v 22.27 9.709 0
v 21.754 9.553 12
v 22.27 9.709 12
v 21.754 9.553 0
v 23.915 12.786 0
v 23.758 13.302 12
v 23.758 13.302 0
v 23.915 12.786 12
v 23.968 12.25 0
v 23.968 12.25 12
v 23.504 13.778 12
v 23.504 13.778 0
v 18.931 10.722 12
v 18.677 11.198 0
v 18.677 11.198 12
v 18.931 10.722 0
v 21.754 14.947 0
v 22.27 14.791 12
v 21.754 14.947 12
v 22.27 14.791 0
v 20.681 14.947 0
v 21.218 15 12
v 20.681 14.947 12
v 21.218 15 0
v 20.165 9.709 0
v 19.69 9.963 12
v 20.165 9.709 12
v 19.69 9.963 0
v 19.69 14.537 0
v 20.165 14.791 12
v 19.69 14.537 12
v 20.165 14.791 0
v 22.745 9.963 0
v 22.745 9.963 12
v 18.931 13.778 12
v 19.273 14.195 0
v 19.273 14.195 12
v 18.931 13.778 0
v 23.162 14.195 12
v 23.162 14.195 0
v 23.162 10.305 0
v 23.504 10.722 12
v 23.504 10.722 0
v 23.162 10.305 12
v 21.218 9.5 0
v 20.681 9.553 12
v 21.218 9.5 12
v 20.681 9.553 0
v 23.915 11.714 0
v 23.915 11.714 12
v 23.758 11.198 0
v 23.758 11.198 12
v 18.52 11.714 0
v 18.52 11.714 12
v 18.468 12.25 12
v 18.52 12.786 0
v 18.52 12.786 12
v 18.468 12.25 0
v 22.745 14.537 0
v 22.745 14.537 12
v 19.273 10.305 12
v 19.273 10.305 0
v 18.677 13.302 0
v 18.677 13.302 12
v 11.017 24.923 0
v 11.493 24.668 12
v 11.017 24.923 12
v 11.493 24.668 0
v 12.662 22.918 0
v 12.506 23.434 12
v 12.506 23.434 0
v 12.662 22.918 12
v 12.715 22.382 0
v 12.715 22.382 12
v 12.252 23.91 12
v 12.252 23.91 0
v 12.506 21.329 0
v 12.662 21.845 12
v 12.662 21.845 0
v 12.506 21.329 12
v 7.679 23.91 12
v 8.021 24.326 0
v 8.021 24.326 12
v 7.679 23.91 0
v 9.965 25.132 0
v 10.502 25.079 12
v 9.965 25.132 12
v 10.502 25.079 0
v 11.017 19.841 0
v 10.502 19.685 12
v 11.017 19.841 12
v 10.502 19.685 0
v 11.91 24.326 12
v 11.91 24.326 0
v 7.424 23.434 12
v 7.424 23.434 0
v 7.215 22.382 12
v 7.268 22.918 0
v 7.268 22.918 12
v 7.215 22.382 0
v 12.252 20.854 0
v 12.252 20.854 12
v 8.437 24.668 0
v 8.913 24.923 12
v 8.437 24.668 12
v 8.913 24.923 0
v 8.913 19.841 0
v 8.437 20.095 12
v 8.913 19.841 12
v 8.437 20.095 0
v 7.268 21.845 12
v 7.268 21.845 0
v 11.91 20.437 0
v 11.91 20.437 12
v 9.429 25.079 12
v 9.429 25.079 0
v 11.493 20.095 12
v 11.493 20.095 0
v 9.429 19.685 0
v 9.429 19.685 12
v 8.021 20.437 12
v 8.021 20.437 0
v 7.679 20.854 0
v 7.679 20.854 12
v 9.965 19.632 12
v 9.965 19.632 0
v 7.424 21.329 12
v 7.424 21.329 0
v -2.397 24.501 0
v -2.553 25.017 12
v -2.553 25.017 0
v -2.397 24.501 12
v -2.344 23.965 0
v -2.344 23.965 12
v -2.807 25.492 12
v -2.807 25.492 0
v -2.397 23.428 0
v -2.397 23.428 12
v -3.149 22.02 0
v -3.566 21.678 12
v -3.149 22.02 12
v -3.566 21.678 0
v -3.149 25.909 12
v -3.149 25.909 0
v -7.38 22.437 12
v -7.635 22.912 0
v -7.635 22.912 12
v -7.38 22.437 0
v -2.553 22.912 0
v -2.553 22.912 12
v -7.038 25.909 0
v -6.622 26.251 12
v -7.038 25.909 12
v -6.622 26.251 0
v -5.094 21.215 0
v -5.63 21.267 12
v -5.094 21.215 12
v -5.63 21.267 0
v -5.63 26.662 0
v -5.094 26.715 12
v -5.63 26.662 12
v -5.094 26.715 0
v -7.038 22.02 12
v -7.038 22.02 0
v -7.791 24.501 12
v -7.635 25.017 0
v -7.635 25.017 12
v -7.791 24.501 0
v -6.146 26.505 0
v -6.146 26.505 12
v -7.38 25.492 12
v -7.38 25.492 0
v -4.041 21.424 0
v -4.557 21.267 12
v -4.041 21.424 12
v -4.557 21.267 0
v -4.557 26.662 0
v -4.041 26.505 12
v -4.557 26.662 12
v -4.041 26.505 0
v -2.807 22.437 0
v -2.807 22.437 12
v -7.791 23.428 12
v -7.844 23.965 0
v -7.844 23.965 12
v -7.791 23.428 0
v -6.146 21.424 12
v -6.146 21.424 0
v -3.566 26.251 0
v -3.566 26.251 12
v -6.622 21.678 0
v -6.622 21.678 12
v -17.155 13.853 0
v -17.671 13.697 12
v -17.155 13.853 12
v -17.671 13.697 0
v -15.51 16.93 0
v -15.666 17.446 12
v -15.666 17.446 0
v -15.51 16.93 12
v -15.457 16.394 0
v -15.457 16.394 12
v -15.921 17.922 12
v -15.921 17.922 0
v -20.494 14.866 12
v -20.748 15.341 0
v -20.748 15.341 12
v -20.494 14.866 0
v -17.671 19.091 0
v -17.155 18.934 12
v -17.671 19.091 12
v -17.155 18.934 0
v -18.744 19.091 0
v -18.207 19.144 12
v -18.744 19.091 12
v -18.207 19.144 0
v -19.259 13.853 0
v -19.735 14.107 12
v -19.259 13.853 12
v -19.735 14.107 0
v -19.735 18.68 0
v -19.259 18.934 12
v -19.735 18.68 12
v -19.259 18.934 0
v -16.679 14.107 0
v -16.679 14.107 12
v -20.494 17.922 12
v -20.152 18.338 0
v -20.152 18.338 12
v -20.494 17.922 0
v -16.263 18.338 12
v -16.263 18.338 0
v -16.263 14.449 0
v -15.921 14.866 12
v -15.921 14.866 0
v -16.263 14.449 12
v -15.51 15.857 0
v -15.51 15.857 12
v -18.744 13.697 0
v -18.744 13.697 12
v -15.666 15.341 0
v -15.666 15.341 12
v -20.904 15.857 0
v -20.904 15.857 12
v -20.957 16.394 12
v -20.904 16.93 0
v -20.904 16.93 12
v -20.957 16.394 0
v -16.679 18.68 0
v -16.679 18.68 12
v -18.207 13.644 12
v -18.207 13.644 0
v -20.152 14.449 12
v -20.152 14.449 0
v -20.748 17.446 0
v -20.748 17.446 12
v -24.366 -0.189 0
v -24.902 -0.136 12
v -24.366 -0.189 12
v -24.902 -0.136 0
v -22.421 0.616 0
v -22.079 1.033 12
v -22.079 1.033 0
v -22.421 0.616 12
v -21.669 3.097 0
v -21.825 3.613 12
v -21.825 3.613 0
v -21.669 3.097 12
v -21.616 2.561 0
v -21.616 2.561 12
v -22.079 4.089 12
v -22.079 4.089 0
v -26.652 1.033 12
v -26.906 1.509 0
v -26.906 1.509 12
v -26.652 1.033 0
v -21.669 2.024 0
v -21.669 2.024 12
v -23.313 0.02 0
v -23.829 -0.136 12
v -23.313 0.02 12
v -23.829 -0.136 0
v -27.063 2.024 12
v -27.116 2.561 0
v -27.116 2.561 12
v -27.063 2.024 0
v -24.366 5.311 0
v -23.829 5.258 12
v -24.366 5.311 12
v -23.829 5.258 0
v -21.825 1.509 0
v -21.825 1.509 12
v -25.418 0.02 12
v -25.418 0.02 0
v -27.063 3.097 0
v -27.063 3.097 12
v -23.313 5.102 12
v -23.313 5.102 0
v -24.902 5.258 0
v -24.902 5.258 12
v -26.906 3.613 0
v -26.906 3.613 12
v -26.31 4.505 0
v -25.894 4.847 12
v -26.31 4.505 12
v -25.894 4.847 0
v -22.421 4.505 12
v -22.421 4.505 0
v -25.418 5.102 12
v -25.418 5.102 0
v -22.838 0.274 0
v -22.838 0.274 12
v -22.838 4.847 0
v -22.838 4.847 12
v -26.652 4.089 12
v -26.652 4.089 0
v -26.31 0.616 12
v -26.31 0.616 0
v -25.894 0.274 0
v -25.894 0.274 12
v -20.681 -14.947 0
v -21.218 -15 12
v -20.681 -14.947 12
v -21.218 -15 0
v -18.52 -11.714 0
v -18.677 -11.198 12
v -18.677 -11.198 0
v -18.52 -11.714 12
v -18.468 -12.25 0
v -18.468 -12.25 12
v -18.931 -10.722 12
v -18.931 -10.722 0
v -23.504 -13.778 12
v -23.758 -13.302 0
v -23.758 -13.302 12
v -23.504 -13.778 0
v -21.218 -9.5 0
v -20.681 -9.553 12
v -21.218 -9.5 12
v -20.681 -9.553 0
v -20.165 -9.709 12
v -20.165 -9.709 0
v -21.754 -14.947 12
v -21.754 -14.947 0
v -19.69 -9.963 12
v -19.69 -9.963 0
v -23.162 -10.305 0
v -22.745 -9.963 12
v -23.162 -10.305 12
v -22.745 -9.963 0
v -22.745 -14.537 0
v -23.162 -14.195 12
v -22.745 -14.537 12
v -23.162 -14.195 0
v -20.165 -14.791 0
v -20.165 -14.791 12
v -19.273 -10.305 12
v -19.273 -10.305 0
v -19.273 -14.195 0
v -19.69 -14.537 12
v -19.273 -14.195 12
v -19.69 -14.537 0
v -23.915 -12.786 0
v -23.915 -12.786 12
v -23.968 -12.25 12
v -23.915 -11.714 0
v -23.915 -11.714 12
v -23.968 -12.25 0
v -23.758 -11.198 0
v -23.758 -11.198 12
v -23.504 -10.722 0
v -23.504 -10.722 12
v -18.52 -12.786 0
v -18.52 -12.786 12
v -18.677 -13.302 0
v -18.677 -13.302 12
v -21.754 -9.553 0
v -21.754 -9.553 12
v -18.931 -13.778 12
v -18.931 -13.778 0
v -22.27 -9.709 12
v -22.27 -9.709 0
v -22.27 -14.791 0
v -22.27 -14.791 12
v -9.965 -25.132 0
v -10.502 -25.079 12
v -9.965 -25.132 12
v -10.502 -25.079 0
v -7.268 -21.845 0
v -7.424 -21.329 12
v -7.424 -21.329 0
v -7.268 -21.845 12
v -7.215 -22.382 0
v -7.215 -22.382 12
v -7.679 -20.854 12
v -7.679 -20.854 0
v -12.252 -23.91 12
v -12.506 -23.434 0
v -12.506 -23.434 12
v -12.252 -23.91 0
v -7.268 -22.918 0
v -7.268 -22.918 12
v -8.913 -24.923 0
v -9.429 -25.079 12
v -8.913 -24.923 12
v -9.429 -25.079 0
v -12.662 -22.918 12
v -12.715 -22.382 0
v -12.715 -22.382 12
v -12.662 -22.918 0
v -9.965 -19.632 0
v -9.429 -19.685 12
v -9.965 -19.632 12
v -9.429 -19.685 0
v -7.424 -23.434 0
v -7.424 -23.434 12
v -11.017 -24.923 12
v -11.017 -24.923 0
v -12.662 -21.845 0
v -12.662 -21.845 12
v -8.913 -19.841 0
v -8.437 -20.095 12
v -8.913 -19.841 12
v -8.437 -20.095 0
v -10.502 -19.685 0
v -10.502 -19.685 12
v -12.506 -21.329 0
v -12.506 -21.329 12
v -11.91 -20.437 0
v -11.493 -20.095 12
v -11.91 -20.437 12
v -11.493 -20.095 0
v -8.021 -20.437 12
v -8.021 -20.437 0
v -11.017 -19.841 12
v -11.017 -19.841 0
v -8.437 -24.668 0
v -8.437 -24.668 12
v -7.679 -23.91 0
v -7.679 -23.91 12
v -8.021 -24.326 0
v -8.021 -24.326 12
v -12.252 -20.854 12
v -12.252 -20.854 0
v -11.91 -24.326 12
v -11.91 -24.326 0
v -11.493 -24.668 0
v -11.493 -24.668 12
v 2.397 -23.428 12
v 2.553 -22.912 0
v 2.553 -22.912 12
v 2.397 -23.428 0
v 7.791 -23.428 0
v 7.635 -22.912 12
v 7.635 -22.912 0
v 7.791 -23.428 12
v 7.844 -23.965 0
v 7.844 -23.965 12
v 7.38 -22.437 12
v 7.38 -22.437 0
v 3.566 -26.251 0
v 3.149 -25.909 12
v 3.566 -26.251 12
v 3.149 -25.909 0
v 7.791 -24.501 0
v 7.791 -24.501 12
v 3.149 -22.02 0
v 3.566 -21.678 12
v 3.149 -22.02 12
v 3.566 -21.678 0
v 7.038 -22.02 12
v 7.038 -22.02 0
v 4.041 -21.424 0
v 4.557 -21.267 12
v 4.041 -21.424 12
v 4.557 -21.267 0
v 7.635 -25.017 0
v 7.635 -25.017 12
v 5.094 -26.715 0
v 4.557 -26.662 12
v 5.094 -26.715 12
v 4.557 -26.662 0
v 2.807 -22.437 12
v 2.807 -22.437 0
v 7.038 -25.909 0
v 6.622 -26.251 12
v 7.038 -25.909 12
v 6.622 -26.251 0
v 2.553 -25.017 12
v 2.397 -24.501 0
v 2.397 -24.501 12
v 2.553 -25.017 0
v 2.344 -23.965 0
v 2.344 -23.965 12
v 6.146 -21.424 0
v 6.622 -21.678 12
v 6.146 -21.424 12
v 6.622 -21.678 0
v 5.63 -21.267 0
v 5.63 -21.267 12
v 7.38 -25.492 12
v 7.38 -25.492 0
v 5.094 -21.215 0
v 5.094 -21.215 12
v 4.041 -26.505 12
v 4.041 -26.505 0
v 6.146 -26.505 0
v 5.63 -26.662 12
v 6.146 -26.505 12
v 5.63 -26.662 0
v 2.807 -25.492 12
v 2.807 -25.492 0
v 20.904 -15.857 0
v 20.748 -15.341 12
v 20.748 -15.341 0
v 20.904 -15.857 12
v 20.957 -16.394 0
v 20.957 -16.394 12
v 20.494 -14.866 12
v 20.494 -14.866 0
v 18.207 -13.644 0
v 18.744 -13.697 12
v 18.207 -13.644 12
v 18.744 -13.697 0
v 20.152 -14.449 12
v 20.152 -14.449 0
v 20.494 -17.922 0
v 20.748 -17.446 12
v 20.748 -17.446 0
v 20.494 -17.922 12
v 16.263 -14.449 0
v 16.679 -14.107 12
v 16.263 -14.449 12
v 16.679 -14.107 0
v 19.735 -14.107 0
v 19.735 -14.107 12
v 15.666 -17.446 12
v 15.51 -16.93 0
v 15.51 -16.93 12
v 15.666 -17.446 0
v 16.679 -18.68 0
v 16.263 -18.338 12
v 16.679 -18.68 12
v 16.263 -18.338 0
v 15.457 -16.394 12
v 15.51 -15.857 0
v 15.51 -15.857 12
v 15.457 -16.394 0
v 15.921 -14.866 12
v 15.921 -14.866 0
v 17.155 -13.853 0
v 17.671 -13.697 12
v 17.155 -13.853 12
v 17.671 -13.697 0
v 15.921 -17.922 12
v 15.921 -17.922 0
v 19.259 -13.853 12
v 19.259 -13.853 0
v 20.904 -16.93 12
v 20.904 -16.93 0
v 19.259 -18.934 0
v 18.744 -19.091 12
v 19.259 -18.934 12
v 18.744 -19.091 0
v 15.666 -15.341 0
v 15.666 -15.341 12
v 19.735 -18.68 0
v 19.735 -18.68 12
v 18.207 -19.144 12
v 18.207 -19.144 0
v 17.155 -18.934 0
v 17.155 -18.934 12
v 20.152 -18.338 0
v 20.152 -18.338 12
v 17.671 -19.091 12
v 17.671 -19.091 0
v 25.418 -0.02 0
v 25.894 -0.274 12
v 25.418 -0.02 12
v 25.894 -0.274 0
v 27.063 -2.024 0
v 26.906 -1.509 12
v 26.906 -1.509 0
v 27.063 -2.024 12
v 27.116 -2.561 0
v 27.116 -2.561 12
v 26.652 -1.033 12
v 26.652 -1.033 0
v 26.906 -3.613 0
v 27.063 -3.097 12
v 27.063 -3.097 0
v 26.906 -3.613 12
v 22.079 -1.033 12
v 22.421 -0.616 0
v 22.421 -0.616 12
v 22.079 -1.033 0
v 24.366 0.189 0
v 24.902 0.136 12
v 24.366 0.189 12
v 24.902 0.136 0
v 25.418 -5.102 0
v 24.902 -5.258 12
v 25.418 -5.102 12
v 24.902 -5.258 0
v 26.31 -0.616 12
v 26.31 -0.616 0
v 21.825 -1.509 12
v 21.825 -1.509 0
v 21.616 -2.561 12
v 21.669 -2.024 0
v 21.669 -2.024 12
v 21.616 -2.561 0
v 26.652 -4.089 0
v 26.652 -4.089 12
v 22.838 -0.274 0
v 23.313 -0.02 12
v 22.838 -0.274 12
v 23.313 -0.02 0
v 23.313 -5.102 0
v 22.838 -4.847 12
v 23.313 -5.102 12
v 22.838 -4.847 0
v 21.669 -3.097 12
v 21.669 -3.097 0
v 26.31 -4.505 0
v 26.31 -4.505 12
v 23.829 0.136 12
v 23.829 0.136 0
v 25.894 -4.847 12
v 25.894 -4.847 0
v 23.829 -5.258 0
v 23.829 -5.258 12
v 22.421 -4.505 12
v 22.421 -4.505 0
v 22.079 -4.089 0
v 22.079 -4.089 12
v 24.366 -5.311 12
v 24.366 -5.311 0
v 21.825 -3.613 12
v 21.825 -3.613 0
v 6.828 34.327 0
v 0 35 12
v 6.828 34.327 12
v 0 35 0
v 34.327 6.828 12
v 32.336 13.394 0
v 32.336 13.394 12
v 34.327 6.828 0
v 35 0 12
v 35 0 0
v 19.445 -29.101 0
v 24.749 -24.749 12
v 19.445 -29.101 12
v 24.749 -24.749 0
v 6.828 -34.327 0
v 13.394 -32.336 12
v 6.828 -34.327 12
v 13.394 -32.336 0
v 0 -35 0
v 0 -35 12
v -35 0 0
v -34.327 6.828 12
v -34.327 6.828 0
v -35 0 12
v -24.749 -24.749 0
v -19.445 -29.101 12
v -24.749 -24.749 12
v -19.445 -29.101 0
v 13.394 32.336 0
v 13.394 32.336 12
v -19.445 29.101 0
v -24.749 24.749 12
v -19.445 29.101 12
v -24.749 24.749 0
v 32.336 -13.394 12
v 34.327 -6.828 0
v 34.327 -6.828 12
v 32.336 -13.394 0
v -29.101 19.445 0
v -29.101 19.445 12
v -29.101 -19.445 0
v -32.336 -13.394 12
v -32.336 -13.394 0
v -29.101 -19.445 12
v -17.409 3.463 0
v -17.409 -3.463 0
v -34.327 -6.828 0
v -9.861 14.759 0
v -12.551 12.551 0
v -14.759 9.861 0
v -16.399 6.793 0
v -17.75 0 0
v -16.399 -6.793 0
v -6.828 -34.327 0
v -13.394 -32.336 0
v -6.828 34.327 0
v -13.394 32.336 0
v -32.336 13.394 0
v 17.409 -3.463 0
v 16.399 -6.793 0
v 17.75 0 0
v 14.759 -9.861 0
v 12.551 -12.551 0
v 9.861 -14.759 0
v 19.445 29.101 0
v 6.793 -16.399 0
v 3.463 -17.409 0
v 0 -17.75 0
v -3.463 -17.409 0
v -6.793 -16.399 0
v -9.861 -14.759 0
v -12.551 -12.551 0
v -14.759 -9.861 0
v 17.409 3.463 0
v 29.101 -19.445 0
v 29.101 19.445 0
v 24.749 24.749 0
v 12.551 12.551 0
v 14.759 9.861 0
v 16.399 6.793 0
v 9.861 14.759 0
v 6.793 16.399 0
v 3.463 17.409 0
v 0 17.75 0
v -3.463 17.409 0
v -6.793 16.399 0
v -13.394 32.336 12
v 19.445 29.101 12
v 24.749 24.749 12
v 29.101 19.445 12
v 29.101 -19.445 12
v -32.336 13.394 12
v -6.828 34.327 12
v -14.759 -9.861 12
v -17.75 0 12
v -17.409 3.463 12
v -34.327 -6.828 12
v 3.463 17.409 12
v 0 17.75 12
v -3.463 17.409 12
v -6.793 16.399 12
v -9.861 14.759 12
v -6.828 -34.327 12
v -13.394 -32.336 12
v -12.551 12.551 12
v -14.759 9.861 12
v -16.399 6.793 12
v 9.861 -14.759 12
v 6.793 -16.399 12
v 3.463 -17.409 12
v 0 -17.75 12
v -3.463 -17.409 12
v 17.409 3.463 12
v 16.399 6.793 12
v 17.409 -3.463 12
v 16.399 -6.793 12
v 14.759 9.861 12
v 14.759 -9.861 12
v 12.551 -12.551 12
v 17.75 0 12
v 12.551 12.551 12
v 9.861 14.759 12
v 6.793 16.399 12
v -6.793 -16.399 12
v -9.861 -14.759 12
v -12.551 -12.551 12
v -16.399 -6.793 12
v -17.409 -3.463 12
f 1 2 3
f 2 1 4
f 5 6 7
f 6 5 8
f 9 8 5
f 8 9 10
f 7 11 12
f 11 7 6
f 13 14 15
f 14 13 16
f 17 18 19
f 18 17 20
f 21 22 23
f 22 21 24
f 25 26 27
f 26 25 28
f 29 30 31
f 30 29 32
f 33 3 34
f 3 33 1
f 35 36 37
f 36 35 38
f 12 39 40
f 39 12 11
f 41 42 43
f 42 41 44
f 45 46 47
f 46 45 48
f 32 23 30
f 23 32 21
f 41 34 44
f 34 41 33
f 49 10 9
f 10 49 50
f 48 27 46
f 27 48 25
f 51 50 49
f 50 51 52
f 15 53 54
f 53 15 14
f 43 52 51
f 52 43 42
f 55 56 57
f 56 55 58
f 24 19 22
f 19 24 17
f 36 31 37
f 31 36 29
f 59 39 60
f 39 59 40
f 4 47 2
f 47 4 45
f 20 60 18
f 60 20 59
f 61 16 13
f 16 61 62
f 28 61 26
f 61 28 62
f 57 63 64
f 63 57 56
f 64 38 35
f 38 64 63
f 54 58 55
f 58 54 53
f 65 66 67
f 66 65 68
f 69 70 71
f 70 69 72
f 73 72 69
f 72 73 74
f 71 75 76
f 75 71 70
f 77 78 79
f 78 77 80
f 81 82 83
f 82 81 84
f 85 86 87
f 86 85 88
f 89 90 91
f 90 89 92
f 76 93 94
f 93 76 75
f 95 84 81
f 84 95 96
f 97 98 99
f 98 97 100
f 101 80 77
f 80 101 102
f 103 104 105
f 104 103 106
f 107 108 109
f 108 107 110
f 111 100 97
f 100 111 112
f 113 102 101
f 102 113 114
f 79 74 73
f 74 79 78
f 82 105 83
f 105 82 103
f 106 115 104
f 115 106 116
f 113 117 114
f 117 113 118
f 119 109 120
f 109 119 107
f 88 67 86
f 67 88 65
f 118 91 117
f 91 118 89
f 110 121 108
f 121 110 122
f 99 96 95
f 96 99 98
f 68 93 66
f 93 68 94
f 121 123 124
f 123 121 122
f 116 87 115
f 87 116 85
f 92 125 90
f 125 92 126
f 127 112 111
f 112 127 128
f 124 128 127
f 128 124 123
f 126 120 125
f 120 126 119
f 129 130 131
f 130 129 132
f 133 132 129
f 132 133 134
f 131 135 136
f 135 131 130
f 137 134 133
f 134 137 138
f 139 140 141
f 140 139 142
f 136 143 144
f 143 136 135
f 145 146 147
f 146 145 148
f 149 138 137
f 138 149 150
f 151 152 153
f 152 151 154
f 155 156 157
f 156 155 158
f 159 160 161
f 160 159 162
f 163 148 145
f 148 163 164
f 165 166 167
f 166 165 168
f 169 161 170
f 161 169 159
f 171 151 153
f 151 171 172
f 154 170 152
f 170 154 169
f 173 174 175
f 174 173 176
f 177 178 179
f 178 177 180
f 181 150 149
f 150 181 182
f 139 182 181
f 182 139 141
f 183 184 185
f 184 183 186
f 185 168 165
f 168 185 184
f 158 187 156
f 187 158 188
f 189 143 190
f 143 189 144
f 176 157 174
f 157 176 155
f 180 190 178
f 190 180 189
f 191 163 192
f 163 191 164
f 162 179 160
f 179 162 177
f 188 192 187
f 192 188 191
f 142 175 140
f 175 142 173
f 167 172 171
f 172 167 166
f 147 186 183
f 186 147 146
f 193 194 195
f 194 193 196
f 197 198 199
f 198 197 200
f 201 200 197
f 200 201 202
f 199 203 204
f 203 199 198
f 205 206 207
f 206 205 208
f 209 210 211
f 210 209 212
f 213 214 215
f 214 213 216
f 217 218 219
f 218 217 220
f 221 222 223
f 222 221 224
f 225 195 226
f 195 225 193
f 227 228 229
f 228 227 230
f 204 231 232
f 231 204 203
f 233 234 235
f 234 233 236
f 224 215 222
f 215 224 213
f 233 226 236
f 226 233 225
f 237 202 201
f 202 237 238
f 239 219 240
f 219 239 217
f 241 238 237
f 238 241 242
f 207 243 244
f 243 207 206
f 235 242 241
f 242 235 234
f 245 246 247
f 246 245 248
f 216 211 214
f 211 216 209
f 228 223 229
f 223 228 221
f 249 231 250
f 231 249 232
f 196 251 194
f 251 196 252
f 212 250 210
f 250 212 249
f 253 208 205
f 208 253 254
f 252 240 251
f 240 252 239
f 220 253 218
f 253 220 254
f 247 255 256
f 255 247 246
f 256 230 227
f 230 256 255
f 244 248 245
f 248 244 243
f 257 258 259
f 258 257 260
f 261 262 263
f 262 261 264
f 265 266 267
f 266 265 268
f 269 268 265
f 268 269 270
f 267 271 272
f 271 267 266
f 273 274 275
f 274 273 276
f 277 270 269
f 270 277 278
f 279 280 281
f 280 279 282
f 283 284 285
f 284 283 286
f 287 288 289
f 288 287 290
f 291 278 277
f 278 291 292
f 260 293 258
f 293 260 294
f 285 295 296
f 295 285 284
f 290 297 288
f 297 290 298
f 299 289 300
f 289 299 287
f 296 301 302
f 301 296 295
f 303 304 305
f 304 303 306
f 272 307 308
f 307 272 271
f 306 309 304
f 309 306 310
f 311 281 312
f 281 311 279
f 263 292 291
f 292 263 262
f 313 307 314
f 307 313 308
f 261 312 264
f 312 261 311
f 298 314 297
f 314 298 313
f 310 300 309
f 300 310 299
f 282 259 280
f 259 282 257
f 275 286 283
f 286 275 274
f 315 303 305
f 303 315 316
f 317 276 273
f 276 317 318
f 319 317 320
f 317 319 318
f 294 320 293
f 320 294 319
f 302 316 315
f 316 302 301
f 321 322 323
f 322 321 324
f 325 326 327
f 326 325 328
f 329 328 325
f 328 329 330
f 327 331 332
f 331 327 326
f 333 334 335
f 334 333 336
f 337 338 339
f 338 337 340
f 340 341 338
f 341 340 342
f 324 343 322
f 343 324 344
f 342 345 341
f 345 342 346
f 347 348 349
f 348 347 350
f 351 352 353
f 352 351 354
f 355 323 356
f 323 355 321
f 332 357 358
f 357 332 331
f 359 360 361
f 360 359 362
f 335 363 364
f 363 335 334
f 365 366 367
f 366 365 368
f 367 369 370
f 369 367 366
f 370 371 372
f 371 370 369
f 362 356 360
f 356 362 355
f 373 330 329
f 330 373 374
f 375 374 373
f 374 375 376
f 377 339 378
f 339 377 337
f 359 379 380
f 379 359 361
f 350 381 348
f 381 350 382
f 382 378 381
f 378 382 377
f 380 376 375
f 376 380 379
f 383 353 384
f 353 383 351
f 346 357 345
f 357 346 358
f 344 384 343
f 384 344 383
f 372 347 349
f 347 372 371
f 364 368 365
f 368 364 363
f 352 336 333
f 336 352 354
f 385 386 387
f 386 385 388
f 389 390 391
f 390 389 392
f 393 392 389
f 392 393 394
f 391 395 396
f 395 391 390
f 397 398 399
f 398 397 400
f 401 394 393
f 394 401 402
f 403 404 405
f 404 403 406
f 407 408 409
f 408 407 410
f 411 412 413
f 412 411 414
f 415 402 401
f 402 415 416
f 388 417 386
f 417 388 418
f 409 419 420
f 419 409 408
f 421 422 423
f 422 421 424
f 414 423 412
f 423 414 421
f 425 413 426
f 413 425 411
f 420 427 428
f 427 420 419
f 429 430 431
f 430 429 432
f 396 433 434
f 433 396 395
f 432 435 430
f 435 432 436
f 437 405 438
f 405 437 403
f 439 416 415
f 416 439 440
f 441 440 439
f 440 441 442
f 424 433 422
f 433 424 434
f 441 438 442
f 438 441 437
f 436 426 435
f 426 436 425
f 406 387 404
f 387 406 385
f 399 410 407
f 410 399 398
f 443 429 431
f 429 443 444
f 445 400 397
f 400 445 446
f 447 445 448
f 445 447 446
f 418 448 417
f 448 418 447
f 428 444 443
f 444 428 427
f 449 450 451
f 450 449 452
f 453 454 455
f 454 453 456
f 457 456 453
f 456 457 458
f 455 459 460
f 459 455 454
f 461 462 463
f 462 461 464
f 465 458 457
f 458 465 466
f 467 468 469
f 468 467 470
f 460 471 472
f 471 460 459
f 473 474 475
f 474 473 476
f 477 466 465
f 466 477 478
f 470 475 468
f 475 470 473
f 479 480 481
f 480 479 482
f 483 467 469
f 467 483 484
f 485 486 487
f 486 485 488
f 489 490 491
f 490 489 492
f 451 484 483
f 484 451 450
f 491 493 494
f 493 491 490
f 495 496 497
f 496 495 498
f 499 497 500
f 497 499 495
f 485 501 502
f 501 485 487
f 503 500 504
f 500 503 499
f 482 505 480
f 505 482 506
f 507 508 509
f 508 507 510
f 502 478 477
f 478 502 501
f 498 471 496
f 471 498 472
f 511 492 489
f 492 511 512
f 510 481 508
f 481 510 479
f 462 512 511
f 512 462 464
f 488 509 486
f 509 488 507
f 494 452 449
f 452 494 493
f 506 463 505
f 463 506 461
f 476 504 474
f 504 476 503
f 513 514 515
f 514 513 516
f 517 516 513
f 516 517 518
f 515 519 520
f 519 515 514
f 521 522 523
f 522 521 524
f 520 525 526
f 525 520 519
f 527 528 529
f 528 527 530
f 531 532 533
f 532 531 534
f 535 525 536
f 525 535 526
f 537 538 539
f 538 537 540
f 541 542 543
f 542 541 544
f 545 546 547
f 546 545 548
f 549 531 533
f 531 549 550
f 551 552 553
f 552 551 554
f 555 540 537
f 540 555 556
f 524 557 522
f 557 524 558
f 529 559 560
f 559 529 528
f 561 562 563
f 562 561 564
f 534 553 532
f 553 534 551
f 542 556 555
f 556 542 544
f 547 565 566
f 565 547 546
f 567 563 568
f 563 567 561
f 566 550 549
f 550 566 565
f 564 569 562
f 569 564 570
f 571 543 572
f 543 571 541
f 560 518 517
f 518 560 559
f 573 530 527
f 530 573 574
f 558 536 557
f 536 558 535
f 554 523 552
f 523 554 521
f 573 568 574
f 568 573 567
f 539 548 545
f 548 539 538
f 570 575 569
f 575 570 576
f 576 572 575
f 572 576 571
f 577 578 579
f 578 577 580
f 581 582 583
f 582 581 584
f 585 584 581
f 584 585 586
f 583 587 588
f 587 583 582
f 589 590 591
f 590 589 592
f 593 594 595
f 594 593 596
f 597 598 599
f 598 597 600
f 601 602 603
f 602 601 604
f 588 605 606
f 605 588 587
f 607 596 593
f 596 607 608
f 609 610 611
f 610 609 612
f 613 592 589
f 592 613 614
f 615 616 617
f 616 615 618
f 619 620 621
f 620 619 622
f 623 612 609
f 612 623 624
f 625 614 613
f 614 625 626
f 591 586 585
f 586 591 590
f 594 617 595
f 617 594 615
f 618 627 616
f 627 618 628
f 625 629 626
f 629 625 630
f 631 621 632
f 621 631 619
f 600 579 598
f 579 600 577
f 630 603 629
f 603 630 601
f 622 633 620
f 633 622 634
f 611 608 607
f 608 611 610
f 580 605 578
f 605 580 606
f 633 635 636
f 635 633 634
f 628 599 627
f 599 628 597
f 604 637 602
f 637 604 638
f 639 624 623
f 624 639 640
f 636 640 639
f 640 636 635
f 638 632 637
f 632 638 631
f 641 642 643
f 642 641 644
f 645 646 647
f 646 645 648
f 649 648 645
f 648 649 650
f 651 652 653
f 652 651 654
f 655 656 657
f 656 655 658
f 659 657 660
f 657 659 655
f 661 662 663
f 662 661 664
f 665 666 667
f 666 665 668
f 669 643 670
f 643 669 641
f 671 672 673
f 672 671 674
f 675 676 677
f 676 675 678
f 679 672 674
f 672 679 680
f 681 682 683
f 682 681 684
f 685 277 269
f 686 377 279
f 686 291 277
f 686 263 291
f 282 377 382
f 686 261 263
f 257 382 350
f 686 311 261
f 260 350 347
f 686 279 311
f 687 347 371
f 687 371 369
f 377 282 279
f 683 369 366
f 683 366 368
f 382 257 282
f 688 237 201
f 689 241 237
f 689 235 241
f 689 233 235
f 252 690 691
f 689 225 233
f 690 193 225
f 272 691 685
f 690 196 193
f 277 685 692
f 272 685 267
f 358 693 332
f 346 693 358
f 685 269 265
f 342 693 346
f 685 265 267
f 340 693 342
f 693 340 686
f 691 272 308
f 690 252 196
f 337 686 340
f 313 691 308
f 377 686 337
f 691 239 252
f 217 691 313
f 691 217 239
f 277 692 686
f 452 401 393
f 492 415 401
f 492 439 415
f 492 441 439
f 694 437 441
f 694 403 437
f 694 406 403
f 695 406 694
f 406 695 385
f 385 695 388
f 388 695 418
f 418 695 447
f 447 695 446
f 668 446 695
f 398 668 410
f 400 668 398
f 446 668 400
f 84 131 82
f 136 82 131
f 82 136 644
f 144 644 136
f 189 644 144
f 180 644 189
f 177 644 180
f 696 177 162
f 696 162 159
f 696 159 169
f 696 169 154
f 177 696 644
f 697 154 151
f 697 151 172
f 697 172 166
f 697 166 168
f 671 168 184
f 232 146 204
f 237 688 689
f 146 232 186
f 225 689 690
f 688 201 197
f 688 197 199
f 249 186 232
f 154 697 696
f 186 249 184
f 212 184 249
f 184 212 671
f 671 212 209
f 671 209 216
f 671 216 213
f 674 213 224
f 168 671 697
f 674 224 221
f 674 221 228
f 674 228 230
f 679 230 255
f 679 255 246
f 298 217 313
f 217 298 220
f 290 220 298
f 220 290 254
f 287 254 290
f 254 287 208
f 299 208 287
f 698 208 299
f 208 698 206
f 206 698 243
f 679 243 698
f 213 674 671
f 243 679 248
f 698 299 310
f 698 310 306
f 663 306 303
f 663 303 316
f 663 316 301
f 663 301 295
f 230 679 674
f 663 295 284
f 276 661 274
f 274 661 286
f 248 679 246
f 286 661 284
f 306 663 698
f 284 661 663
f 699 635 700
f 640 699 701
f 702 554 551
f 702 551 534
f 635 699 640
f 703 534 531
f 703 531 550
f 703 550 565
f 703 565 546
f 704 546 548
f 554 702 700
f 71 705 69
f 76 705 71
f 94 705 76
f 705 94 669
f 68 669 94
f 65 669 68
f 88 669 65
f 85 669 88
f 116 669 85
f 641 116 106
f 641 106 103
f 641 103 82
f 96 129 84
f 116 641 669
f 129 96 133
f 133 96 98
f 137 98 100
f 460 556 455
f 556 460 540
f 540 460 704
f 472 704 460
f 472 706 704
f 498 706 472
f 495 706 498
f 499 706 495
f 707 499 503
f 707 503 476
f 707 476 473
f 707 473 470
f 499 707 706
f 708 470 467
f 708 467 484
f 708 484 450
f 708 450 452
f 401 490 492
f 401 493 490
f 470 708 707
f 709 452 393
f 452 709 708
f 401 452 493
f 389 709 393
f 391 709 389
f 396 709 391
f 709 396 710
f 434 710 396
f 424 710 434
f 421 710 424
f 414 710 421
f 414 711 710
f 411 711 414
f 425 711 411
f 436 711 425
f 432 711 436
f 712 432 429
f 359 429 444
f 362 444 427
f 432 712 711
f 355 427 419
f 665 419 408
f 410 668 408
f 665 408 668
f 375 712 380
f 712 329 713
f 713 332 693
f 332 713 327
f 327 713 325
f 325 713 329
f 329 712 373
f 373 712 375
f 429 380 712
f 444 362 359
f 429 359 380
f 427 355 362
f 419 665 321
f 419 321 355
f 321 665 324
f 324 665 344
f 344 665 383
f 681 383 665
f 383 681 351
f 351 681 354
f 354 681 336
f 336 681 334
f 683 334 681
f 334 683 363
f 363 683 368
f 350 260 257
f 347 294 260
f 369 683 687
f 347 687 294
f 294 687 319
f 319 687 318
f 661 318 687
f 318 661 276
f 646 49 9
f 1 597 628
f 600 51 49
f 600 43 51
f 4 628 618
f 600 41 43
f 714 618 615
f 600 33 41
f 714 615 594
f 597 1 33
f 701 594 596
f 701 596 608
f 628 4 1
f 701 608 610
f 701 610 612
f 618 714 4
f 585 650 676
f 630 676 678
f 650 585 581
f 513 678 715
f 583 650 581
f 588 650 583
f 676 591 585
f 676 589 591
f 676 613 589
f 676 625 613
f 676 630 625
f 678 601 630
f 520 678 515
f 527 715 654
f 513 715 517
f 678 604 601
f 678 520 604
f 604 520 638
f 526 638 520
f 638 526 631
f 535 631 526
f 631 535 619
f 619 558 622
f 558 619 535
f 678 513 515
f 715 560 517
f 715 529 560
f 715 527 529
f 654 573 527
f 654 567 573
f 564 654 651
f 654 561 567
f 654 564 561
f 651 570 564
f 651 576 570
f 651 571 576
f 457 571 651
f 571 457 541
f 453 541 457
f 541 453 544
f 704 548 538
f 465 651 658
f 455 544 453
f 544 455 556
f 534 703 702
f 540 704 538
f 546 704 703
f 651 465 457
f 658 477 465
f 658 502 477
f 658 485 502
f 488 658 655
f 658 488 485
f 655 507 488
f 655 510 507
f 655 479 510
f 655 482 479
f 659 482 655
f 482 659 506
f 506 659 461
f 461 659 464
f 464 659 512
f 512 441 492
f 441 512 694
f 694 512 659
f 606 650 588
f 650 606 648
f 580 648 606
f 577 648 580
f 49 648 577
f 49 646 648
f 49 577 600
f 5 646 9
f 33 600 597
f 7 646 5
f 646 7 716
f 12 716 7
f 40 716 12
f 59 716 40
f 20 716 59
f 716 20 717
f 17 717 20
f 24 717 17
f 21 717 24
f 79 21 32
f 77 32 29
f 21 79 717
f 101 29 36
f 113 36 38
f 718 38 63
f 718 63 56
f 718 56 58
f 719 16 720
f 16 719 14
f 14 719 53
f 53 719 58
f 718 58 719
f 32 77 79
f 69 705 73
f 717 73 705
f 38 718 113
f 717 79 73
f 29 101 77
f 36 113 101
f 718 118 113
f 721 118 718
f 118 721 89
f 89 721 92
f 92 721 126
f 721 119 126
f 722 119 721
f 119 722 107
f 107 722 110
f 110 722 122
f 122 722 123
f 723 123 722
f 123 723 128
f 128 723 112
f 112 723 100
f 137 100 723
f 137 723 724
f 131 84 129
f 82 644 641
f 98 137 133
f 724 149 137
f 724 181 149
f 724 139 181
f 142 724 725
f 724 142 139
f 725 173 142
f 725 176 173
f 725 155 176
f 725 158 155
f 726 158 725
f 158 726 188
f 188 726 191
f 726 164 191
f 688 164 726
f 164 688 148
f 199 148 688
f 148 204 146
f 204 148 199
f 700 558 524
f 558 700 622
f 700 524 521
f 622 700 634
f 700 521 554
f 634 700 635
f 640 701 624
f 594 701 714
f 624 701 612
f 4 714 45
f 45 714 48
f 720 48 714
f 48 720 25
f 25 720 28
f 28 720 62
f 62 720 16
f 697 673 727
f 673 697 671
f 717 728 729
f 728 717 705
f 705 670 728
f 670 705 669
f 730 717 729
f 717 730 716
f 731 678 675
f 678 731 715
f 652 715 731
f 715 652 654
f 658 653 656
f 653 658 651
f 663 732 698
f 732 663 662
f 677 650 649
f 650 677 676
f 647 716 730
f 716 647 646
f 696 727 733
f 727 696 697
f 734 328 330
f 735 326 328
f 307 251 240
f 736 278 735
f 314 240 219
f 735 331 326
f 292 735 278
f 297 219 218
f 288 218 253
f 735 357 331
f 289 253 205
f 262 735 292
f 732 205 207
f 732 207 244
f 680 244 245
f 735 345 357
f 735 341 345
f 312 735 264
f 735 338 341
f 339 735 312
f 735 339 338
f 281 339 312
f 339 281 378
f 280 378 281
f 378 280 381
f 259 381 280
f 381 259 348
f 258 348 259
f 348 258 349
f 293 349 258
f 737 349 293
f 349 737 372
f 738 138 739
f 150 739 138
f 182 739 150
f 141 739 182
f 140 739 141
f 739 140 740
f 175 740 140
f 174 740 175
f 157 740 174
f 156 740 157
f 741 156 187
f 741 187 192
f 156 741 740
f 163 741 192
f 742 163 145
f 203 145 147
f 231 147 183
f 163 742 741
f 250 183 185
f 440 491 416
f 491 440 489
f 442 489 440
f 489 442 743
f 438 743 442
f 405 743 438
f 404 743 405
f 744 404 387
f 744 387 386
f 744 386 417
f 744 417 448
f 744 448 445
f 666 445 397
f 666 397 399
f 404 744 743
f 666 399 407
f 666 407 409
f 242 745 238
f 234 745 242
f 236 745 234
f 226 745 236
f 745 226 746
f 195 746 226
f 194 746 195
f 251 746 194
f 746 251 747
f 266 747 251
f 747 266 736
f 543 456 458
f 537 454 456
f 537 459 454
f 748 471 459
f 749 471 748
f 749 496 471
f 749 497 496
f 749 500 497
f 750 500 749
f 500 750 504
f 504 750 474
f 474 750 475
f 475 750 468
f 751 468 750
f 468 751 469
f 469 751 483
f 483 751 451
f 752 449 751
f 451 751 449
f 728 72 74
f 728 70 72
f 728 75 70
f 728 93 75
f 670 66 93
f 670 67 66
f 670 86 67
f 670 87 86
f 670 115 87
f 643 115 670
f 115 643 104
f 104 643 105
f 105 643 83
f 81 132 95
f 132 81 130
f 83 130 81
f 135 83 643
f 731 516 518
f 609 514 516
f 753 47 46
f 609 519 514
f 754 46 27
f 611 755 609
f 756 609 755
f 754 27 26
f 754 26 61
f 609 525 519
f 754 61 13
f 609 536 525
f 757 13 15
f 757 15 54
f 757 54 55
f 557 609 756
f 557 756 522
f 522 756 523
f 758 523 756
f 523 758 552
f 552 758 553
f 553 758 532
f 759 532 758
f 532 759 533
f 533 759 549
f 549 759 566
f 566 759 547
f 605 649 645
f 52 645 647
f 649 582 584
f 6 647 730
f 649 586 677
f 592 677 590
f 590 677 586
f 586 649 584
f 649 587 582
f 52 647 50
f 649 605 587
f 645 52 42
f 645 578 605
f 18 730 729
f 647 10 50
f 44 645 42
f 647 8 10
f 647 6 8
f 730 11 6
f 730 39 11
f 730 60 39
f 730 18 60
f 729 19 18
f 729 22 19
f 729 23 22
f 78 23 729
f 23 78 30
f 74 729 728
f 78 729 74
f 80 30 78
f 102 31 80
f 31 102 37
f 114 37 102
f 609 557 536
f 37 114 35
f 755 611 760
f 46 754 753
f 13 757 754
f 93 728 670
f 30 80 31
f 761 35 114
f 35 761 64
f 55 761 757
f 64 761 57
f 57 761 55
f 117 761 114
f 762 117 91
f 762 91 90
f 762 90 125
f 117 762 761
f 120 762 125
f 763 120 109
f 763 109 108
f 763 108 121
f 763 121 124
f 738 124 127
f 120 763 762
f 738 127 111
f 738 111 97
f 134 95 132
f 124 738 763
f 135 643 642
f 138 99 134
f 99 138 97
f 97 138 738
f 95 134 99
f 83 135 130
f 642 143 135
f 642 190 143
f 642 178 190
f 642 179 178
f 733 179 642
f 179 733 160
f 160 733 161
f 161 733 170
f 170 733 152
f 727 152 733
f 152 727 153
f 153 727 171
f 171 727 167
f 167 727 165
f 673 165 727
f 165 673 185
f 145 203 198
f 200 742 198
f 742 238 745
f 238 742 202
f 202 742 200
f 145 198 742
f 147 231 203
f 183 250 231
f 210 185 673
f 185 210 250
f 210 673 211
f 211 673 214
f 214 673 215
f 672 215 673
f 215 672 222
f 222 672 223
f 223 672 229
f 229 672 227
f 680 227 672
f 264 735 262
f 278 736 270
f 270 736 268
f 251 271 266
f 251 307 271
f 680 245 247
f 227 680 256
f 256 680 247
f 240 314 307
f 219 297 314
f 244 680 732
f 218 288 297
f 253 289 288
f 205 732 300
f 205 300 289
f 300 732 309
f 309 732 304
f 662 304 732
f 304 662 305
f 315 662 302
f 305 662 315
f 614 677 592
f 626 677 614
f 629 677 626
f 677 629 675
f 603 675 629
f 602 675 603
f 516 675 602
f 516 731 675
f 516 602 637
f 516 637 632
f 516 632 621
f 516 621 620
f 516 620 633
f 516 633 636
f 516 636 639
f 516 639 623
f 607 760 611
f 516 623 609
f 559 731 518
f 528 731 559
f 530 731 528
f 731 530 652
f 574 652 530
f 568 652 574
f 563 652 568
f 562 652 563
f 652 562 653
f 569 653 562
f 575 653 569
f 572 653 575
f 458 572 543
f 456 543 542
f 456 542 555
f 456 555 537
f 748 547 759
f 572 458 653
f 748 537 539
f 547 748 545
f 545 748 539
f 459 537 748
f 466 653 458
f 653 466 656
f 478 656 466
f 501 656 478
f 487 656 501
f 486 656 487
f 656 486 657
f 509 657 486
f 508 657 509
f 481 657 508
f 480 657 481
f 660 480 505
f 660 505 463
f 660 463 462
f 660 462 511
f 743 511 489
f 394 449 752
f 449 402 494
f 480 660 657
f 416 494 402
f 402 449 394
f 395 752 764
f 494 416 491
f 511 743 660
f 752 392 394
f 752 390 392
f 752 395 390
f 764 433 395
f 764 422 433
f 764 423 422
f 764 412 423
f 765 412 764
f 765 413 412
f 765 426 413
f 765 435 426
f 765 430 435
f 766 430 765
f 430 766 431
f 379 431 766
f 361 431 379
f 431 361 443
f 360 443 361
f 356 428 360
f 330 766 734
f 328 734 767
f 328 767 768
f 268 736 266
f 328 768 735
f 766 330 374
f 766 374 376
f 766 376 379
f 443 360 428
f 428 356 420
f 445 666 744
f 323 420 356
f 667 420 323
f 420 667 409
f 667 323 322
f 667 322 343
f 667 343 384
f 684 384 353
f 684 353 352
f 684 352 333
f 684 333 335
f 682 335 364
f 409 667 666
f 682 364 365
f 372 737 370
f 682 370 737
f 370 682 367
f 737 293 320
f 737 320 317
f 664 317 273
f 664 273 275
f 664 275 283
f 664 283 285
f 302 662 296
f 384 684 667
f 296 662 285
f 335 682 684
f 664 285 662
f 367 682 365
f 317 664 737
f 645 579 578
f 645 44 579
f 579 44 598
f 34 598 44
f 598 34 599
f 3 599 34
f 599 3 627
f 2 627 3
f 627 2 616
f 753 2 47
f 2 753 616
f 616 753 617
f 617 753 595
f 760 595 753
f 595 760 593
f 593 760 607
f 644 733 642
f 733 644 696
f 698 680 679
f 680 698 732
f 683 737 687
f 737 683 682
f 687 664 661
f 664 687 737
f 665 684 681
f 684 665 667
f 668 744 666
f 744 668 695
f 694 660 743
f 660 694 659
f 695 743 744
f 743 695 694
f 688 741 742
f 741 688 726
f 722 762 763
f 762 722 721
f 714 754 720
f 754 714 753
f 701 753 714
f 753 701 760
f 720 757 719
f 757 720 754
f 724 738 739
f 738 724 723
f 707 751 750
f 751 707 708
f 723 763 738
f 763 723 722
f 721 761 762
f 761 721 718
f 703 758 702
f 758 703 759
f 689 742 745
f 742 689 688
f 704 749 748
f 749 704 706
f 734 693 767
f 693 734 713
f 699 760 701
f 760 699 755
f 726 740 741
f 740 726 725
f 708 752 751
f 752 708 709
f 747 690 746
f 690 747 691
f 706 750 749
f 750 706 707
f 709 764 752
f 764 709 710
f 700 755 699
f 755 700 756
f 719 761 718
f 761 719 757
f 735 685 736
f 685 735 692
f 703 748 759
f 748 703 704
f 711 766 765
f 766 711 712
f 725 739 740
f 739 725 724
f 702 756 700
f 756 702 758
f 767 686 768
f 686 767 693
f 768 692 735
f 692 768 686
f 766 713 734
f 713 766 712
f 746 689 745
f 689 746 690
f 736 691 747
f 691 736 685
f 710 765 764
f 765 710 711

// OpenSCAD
$fn = 32;

// ----------------------------------------------------------------------
// Flange Ø70 x 12
// 10 holes on a Ø49 bolt circle, bolted joints
// ----------------------------------------------------------------------

// --- parameters (mm) ---
flange_d = 70;   // outside diameter of the flange
thickness = 12;  // flange thickness
holes = 10;      // number of bolt holes
pcd = 49;        // bolt circle diameter
start_deg = 30;  // angle of the first hole, from +X
hole_d = 5.5;    // bolt hole diameter
bore_d = 35.5;   // central through bore
hub_d = 43.5;    // hub outside diameter
hub_h = 0;       // hub height above the flange face (0 = no hub)

// --- derived feature positions (mm) ---
height = thickness + hub_h;  // = 12   overall height of the part
pcd_r = pcd / 2;             // = 24.5   bolt circle radius
hole_step = 360 / holes;     // = 36   angular pitch
feature_centers = [
  [pcd_r * cos(start_deg + 0 * hole_step), pcd_r * sin(start_deg + 0 * hole_step)],
  [pcd_r * cos(start_deg + 1 * hole_step), pcd_r * sin(start_deg + 1 * hole_step)],
  [pcd_r * cos(start_deg + 2 * hole_step), pcd_r * sin(start_deg + 2 * hole_step)],
  [pcd_r * cos(start_deg + 3 * hole_step), pcd_r * sin(start_deg + 3 * hole_step)],
  [pcd_r * cos(start_deg + 4 * hole_step), pcd_r * sin(start_deg + 4 * hole_step)],
  [pcd_r * cos(start_deg + 5 * hole_step), pcd_r * sin(start_deg + 5 * hole_step)],
  [pcd_r * cos(start_deg + 6 * hole_step), pcd_r * sin(start_deg + 6 * hole_step)],
  [pcd_r * cos(start_deg + 7 * hole_step), pcd_r * sin(start_deg + 7 * hole_step)],
  [pcd_r * cos(start_deg + 8 * hole_step), pcd_r * sin(start_deg + 8 * hole_step)],
  [pcd_r * cos(start_deg + 9 * hole_step), pcd_r * sin(start_deg + 9 * hole_step)]
];   // bolt hole centres on the pitch circle

// flange disc, every hole and the bore cut straight through
difference() {
  union() {
    cylinder(d = flange_d, h = thickness);
  }
  translate([0, 0, -1]) cylinder(d = bore_d, h = height + 2);  // bore, through
  for (centre = feature_centers)
    translate([centre[0], centre[1], -1]) cylinder(d = hole_d, h = thickness + 2);
}
